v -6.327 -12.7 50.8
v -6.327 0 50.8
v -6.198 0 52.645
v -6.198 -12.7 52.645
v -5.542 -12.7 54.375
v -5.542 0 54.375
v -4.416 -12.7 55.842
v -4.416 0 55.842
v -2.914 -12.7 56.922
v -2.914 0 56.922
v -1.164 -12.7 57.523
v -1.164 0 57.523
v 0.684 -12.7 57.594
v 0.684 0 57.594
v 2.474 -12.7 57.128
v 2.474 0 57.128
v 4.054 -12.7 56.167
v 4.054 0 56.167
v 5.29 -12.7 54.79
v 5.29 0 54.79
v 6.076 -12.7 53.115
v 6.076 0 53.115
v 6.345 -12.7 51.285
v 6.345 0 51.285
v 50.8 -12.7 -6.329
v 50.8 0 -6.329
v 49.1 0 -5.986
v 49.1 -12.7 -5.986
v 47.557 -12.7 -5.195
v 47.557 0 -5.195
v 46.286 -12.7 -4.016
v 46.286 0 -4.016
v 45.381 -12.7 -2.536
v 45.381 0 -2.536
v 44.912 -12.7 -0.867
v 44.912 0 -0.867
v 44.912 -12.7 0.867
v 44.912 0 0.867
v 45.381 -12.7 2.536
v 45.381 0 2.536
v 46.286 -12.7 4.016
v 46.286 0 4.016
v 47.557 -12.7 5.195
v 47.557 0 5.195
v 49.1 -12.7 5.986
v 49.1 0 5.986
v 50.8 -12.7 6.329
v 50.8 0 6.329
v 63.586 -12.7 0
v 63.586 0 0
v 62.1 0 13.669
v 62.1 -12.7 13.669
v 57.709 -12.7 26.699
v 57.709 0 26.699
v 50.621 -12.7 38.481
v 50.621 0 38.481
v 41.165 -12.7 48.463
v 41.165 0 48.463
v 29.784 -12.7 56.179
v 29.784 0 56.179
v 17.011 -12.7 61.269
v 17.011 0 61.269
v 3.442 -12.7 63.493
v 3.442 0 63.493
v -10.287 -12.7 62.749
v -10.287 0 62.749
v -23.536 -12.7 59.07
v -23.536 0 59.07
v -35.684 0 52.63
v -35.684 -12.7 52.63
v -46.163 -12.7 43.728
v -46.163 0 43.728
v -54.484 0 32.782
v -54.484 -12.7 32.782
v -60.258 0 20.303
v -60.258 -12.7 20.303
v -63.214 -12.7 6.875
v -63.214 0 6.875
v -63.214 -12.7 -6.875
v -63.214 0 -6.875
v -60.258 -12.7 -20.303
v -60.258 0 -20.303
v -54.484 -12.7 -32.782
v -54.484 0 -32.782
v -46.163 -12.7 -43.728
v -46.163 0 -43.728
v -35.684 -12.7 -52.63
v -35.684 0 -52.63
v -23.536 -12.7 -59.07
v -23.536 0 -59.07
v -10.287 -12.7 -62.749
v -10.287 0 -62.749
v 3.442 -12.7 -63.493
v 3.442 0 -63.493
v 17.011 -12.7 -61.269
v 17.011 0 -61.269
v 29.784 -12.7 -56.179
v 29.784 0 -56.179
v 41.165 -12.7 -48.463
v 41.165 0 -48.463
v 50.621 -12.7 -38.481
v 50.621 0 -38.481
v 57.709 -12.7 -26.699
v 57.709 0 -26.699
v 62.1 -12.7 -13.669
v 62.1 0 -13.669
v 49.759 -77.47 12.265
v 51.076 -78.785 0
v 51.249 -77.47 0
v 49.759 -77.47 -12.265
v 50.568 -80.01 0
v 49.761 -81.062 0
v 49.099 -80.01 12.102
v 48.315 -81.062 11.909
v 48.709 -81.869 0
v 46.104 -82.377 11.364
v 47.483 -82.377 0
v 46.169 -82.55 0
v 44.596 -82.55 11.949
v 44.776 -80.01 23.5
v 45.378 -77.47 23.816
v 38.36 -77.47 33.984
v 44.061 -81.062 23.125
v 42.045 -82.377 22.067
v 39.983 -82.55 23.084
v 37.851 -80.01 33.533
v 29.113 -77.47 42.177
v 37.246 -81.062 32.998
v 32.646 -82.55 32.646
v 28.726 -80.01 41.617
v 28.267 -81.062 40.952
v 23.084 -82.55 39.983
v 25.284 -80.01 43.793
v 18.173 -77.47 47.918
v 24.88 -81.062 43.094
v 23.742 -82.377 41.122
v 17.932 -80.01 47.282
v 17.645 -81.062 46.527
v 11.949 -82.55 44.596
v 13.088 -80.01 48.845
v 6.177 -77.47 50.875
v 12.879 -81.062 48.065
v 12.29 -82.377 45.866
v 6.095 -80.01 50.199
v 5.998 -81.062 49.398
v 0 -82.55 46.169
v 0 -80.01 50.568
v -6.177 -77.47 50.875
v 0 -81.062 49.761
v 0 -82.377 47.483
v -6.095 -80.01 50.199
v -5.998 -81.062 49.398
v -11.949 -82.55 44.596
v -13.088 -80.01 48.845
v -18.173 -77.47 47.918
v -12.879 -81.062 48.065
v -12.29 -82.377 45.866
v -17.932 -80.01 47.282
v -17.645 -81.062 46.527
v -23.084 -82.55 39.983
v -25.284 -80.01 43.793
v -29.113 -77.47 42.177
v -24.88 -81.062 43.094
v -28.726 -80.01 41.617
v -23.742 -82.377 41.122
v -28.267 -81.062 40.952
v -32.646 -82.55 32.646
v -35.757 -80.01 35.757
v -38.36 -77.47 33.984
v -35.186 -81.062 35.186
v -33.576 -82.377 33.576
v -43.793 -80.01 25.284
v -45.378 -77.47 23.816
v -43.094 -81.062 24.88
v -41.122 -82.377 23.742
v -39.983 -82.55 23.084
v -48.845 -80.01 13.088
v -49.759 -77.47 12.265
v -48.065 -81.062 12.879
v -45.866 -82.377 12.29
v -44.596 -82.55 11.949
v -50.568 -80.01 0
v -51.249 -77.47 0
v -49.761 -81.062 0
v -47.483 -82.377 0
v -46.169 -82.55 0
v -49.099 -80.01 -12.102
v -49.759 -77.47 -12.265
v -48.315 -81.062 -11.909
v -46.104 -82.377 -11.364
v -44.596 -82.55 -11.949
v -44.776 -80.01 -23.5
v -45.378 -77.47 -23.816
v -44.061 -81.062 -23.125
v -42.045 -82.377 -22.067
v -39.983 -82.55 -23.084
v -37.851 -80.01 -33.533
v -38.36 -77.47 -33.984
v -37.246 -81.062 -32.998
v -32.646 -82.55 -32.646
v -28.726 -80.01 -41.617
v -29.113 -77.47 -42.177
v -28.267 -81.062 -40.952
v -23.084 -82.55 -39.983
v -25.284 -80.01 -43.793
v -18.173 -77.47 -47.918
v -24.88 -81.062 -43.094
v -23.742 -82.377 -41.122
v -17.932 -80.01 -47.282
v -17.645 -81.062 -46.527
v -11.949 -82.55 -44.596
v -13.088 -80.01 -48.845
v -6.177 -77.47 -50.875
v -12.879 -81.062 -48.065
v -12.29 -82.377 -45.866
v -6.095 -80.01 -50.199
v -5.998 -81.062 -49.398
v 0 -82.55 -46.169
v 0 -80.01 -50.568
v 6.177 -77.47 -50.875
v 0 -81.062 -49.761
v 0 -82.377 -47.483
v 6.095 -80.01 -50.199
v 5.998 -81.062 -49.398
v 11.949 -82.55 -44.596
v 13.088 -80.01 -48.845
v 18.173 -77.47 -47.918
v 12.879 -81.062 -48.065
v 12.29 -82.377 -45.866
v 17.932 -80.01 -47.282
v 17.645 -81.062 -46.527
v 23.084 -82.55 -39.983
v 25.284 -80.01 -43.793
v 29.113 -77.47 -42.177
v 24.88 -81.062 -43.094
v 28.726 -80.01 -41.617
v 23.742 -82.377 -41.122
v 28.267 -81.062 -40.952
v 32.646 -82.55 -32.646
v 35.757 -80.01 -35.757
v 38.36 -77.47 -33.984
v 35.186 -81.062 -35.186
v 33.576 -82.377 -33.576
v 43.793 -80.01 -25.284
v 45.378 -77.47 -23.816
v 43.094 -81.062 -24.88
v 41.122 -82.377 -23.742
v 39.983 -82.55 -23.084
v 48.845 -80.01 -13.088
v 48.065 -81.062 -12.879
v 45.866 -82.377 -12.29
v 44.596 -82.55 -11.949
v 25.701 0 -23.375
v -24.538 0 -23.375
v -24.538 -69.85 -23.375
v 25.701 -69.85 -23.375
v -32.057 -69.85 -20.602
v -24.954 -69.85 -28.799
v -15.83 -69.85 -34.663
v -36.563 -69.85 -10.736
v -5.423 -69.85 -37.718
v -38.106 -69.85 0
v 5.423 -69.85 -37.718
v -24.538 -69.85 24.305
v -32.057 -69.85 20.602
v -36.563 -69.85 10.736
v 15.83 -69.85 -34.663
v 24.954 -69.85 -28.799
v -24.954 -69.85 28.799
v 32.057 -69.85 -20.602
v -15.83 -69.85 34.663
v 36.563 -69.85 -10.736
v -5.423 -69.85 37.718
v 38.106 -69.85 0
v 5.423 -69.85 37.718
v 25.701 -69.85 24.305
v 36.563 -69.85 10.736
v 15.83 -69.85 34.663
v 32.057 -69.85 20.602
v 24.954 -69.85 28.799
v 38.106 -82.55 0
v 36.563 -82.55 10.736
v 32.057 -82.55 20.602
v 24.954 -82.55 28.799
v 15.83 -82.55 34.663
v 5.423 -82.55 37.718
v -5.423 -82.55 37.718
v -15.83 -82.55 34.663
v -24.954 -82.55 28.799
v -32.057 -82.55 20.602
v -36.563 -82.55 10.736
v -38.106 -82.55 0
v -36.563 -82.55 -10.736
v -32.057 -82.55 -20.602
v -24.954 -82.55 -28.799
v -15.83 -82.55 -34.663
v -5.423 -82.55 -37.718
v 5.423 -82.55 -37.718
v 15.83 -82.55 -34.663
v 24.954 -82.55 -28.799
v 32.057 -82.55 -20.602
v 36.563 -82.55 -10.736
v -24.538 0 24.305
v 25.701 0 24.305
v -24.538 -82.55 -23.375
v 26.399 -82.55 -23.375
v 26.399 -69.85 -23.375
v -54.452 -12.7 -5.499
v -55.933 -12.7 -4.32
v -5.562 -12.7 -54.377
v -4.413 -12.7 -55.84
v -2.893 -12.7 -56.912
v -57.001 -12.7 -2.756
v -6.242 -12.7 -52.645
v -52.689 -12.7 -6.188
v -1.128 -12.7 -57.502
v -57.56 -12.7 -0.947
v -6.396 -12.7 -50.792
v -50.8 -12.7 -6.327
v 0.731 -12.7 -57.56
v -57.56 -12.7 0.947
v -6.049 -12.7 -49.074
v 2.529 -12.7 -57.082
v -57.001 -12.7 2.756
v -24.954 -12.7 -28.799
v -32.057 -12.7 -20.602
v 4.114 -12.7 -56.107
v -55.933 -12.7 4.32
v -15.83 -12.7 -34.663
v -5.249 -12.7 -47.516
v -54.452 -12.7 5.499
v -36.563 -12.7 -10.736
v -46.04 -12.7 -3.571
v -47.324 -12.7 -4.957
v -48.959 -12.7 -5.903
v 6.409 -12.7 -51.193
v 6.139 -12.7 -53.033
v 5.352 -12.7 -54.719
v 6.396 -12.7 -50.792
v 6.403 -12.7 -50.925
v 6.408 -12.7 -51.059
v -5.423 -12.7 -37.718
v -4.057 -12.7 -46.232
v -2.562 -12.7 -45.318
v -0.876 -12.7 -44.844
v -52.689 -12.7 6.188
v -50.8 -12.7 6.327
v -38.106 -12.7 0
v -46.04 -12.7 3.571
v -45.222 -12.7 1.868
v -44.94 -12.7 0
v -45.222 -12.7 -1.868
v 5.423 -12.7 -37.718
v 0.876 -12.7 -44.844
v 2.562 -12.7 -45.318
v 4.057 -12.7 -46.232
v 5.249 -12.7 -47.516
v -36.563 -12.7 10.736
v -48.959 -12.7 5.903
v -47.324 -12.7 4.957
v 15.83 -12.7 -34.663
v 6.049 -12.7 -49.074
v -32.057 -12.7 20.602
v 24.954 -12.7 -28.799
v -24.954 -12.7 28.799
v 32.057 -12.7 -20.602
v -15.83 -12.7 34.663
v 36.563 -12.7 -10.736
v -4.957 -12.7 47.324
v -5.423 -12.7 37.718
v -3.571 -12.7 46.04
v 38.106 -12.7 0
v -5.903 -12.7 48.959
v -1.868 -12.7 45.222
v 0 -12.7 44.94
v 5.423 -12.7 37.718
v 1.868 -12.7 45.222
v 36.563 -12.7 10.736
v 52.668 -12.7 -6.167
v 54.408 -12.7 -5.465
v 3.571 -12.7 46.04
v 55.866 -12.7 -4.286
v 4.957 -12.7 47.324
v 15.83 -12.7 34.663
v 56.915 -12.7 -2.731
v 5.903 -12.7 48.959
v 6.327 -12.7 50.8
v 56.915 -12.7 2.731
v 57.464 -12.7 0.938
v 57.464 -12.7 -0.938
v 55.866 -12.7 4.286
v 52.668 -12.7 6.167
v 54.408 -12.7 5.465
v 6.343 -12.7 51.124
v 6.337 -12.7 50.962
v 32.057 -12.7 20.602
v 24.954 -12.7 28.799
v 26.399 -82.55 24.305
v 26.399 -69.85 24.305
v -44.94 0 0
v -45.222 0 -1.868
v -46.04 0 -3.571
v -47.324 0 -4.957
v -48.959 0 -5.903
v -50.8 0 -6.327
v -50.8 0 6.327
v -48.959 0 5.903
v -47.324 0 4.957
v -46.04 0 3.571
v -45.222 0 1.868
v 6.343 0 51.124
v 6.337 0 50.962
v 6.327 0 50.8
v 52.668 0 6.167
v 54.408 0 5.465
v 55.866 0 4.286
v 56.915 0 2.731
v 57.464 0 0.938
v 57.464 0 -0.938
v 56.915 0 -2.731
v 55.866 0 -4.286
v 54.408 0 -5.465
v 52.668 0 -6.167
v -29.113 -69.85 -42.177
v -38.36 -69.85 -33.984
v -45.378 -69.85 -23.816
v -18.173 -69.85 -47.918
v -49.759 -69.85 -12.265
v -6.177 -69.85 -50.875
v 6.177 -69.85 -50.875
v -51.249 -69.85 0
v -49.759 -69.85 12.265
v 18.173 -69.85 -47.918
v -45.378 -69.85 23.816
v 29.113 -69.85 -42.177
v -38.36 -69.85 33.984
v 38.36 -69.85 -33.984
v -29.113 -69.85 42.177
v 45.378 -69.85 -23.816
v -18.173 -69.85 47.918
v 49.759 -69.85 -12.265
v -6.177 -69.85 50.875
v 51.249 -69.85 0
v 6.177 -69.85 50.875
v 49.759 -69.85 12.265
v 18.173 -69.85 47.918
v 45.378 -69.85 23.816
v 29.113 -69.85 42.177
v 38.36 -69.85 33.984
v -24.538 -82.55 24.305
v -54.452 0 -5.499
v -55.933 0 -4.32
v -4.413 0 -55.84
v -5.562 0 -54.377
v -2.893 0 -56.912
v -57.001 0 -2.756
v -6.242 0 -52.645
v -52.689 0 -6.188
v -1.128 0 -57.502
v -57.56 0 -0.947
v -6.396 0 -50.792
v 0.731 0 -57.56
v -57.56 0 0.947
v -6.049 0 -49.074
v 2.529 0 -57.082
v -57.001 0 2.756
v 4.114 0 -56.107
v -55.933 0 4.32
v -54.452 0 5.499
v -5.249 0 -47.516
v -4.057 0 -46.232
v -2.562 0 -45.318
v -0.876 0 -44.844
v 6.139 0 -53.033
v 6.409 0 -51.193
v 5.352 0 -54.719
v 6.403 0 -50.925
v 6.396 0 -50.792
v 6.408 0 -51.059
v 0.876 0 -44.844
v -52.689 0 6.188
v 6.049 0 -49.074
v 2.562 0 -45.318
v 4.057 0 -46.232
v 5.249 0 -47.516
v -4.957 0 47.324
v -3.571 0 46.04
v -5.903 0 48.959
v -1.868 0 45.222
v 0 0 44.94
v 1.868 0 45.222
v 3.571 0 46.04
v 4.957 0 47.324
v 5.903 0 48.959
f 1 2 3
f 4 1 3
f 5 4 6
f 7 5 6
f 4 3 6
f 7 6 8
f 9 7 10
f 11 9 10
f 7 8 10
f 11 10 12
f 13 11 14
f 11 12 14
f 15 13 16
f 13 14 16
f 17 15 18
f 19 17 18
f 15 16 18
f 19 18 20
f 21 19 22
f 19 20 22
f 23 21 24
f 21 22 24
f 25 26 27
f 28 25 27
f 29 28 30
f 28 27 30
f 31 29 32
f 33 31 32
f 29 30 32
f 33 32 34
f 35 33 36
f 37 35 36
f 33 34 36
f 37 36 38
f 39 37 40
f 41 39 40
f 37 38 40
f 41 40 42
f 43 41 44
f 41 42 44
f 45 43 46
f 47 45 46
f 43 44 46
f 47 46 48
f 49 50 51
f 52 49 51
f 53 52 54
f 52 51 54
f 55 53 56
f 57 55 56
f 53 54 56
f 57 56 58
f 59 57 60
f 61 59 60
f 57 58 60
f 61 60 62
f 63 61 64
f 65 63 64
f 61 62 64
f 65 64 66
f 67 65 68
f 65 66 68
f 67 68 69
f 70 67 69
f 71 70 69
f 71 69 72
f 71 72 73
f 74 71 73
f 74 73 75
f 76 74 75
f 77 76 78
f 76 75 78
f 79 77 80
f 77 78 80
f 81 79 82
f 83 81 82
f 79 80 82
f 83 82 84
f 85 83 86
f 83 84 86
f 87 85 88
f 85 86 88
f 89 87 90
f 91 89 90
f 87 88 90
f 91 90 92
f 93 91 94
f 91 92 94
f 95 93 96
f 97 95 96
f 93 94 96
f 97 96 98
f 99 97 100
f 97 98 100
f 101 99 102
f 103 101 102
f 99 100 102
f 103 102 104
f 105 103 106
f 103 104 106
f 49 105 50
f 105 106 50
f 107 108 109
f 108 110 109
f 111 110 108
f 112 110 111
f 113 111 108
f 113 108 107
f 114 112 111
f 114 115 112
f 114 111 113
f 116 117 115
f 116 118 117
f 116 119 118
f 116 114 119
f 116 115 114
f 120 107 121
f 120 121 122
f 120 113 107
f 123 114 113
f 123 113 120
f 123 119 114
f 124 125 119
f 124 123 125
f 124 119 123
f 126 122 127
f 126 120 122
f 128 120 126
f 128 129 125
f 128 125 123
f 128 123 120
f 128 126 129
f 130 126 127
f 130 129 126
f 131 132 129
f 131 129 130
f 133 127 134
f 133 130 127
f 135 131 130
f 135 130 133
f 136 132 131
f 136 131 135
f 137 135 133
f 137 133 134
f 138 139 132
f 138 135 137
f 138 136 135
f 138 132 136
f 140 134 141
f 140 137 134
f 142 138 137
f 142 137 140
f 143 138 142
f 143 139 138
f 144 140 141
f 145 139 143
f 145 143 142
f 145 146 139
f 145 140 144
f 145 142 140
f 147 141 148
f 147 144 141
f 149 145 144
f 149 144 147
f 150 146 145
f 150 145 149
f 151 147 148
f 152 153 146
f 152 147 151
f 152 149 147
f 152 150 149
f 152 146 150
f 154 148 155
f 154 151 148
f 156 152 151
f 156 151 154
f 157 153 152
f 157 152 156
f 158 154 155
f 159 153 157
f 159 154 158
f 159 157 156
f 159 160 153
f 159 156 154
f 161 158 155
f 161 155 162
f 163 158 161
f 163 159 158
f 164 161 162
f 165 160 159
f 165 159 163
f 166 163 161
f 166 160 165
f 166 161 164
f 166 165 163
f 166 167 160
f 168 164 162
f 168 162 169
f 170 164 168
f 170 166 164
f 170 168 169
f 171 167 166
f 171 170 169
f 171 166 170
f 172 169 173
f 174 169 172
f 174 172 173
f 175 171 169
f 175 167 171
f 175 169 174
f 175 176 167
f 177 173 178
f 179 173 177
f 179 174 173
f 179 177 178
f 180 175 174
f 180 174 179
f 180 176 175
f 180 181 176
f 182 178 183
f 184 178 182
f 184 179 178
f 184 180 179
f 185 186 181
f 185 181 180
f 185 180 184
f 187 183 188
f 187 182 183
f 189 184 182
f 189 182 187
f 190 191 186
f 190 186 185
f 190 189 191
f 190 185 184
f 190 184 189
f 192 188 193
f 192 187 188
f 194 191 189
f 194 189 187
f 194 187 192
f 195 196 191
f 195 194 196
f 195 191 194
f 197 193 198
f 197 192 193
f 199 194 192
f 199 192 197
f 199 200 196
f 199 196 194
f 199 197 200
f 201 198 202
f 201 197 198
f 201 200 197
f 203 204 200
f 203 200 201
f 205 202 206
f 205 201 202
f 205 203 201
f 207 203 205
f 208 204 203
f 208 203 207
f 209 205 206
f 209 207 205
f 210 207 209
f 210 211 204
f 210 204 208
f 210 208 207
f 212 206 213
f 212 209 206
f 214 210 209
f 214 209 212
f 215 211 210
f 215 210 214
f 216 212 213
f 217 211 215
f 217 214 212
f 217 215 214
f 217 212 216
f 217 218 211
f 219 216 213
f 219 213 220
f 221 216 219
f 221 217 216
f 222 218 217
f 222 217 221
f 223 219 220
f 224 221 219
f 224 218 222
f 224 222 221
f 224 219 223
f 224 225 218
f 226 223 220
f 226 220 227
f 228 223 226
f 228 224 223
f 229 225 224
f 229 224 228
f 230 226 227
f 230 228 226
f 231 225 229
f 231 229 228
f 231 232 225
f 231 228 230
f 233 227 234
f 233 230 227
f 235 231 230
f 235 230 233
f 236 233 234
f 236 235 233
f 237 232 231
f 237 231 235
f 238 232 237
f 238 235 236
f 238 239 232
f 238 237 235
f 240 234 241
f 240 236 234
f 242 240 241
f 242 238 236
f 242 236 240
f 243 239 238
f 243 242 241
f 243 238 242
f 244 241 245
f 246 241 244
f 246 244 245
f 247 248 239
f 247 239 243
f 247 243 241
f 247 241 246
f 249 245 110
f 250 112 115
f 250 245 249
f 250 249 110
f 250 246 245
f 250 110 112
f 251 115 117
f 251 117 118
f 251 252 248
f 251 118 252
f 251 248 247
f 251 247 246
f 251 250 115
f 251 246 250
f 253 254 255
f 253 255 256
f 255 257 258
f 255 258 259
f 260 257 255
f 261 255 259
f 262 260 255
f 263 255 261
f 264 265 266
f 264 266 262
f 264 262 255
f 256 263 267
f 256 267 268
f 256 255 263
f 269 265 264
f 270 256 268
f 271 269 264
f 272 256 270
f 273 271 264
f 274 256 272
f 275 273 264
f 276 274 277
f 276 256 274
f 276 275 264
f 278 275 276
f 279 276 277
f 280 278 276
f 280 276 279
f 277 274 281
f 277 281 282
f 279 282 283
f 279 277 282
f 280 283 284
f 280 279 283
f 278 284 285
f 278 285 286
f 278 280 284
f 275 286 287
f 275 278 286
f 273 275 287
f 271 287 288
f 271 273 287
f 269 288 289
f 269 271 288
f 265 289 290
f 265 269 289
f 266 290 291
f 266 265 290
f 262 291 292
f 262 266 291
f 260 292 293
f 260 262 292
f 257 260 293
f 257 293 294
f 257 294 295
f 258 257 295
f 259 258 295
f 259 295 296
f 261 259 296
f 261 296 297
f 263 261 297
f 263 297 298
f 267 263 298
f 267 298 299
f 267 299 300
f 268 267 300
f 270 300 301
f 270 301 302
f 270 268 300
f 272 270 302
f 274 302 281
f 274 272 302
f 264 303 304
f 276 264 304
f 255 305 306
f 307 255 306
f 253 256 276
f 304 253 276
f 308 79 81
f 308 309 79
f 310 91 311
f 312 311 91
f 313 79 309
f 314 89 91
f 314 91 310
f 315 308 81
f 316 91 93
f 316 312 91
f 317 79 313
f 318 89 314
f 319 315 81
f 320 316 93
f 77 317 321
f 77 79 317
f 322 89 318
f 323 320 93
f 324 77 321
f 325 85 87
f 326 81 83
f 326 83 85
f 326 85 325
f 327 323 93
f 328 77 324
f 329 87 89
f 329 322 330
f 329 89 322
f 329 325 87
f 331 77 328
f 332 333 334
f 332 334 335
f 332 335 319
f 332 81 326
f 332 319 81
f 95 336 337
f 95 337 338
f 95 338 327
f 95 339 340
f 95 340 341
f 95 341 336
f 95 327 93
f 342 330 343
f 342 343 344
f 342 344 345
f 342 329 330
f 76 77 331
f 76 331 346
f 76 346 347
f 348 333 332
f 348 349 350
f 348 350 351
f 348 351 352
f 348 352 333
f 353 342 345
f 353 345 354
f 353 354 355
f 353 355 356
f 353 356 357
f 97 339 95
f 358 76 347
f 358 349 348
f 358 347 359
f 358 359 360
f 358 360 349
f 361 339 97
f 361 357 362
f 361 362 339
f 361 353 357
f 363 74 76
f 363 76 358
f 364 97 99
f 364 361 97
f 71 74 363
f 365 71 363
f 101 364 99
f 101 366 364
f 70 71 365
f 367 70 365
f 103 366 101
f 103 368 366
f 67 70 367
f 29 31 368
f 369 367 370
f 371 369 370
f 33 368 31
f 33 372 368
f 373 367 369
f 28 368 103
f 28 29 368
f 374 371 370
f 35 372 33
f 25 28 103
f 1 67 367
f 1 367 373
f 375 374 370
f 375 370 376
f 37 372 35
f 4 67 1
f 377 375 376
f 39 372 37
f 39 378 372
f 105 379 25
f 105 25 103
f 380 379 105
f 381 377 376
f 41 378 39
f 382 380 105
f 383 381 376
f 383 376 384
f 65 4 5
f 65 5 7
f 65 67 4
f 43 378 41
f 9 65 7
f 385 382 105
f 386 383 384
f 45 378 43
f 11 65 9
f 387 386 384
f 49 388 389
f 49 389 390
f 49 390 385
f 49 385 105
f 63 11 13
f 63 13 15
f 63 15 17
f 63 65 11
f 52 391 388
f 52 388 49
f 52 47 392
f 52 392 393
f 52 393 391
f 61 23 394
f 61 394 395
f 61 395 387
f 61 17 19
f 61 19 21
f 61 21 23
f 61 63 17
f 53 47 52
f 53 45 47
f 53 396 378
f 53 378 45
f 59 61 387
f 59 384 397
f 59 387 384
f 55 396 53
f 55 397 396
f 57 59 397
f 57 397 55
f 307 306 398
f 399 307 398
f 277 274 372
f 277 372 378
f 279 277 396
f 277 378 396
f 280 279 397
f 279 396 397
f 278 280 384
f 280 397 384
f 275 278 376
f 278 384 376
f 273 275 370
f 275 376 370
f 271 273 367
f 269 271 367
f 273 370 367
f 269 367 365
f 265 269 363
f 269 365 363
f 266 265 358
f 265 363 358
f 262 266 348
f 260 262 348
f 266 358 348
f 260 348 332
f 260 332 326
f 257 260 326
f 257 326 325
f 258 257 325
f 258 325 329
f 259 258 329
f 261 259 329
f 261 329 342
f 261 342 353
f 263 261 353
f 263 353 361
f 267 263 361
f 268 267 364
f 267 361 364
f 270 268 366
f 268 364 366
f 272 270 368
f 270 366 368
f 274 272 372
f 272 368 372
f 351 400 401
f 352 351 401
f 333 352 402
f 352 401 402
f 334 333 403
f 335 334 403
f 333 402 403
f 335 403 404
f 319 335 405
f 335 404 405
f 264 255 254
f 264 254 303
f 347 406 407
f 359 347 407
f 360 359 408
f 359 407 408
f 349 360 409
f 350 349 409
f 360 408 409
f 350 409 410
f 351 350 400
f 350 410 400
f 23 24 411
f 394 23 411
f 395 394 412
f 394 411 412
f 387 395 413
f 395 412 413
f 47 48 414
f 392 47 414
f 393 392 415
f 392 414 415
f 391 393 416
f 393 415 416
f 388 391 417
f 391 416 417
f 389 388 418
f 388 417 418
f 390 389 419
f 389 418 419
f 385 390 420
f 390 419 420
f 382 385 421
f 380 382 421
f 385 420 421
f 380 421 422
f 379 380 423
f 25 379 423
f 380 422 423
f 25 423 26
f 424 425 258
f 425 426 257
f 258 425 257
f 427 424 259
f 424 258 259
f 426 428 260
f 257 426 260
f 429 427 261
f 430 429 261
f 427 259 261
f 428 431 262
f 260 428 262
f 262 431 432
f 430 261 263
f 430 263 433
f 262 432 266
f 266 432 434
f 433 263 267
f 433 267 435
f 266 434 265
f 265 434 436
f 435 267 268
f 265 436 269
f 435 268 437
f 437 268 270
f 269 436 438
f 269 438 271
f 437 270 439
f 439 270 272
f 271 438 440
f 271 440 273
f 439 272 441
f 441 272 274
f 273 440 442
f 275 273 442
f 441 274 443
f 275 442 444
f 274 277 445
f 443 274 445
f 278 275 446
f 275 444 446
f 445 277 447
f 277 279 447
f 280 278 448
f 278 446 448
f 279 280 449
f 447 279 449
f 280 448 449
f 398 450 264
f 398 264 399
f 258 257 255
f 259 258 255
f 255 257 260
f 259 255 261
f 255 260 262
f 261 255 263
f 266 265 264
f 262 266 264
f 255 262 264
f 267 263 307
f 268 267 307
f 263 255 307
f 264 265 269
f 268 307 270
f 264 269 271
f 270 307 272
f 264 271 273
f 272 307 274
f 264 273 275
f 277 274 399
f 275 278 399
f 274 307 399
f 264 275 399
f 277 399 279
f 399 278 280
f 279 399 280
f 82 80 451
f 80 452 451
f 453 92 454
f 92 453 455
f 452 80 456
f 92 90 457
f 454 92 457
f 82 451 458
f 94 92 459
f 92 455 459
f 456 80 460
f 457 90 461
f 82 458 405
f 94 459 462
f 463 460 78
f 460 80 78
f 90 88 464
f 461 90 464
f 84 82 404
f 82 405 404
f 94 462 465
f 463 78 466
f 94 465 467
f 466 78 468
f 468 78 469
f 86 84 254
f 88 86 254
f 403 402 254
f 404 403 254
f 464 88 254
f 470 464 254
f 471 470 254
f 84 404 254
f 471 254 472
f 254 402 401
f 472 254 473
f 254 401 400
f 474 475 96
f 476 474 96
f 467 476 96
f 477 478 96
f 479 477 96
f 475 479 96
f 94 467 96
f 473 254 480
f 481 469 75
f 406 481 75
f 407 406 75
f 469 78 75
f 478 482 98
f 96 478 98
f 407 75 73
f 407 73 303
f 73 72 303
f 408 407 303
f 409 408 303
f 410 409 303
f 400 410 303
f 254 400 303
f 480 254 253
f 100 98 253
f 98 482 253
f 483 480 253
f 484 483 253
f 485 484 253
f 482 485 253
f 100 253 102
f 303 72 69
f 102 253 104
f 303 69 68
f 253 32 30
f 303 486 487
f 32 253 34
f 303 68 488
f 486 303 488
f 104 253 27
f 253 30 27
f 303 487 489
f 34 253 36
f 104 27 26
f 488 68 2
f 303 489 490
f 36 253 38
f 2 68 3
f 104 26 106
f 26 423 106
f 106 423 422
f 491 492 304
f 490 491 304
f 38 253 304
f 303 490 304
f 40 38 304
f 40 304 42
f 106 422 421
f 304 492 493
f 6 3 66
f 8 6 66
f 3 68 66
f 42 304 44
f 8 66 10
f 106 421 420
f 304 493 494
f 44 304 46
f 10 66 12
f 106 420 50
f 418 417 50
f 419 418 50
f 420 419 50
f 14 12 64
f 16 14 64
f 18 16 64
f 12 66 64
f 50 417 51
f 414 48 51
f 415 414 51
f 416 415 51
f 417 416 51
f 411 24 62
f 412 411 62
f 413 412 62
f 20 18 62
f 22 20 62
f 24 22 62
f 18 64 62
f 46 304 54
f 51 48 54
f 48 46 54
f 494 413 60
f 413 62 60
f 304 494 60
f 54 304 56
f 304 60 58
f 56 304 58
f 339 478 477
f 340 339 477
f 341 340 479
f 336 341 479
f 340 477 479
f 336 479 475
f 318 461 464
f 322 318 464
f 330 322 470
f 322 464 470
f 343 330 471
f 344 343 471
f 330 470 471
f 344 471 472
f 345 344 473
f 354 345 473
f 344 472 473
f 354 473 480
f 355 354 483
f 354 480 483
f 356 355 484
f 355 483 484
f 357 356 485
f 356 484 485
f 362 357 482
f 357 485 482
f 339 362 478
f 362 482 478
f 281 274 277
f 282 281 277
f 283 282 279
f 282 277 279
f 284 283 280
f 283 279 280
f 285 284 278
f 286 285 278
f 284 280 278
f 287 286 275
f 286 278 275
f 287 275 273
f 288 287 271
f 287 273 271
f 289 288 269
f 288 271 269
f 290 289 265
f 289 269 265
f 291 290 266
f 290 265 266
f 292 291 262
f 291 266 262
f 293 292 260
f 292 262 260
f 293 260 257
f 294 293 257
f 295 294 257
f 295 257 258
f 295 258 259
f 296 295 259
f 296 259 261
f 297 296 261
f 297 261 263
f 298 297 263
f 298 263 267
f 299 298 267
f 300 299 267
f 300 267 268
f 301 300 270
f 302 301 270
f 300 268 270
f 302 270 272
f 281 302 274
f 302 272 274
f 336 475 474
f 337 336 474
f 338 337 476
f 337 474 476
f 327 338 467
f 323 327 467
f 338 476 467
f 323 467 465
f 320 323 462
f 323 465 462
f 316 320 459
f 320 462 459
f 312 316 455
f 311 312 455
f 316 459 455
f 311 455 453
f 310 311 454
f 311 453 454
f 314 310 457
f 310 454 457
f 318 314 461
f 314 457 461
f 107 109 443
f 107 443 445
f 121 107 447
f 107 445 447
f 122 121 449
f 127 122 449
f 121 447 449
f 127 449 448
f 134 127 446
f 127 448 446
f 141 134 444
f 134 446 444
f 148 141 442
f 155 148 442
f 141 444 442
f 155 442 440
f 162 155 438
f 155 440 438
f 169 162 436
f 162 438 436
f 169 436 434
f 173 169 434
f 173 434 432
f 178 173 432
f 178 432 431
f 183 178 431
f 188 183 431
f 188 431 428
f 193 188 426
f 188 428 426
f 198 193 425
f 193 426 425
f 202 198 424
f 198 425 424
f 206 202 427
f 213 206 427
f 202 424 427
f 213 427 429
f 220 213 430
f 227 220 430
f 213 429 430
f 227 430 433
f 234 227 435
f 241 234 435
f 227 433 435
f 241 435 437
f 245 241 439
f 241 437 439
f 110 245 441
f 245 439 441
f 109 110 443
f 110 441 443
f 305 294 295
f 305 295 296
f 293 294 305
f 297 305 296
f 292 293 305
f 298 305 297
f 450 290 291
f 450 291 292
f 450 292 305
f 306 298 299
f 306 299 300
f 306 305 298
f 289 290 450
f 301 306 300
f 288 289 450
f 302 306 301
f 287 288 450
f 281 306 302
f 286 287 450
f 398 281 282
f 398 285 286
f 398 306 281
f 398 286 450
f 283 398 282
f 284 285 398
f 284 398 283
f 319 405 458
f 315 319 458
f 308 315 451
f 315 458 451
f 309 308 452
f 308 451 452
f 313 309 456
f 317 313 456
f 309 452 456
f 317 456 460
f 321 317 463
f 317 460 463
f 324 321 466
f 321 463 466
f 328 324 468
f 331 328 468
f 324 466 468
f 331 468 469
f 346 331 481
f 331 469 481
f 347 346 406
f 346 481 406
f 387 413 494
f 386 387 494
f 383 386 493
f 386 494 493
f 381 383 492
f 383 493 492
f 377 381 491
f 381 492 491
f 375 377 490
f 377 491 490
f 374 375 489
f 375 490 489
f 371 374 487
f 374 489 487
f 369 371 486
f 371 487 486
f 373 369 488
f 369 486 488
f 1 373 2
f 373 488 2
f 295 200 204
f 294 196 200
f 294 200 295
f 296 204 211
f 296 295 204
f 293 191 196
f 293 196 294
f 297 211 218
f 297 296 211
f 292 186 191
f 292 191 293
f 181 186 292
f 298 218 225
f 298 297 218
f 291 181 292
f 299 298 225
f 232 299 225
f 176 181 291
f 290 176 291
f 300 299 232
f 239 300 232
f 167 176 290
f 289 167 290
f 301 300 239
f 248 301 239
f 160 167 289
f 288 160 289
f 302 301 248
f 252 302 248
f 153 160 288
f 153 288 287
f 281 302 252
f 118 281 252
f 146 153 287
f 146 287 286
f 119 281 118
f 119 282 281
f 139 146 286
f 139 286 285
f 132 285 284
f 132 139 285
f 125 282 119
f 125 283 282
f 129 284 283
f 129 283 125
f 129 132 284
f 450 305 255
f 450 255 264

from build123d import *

# Parameters (mm, degrees)
F0_R      = 63.58634276
F1_DEPTH  = 12.7
F2_R      = 38.1063465956
F3_DEPTH  = 57.15
F4_R      = 51.2486821377
F4_R_2    = 38.1063465956
F5_DEPTH  = 12.7
F6_DEPTH  = 12.7
F7_W      = 50.9365983307
F7_H      = 47.6803779602
F8_DEPTH  = 80.518
F9_W      = 50.2388384193
F9_H      = 47.6803779602
F10_DEPTH = 76.2
F11_R     = 5.08


with BuildPart() as f1:
    # F0 (on Front) → F1 (new body)
    with BuildSketch(Plane.XZ):
        Circle(F0_R)
        with BuildLine():
            ThreePointArc((-50.8002620834, -6.3266222589), (-57.6306849484, 0), (-50.8002620834, 6.3266222589))
            ThreePointArc((-50.8002620834, 6.3266222589), (-36.198705237, 36.198708763), (-6.3266173105, 50.8002626996))
            ThreePointArc((-6.3266173105, 50.8002626996), (-0.2427860502, 57.6260293987), (6.3451967395, 51.2854792178))
            ThreePointArc((6.3451967395, 51.2854792178), (6.340550181, 51.0426931676), (6.3266173105, 50.8002626996))
            ThreePointArc((6.3266173105, 50.8002626996), (36.1980247945, 36.1993891927), (50.8000242013, 6.3285320647))
            ThreePointArc((50.8000242013, 6.3285320647), (55.5352050309, 4.6203013939), (57.533405357, 0))
            ThreePointArc((57.533405357, 0), (55.5352050309, -4.6203013939), (50.8000242013, -6.3285320647))
            ThreePointArc((50.8000242013, -6.3285320647), (36.2228821576, -36.1745156863), (6.3964022479, -50.7915230647))
            ThreePointArc((6.3964022479, -50.7915230647), (6.4058278822, -50.9920143065), (6.4089707878, -51.1927023798))
            ThreePointArc((6.4089707878, -51.1927023798), (-0.2006880733, -57.598530262), (-6.3964022479, -50.7915230647))
            ThreePointArc((-6.3964022479, -50.7915230647), (-36.2235621326, -36.1738347894), (-50.8002620834, -6.3266222589))
        make_face(mode=Mode.SUBTRACT)
        with BuildLine():
            ThreePointArc((-50.8002620834, 6.3266222589), (-46.6303560457, 4.3117724961), (-44.9402809377, 0))
            ThreePointArc((-44.9402809377, 0), (-46.6303560457, -4.3117724961), (-50.8002620834, -6.3266222589))
            ThreePointArc((-50.8002620834, -6.3266222589), (-36.2235621326, -36.1738347894), (-6.3964022479, -50.7915230647))
            ThreePointArc((-6.3964022479, -50.7915230647), (0, -44.7837315919), (6.3964022479, -50.7915230647))
            ThreePointArc((6.3964022479, -50.7915230647), (36.2228821576, -36.1745156863), (50.8000242013, -6.3285320647))
            ThreePointArc((50.8000242013, -6.3285320647), (44.8519994025, 0), (50.8000242013, 6.3285320647))
            ThreePointArc((50.8000242013, 6.3285320647), (36.1980247945, 36.1993891927), (6.3266173105, 50.8002626996))
            ThreePointArc((6.3266173105, 50.8002626996), (0, 44.9402824782), (-6.3266173105, 50.8002626996))
            ThreePointArc((-6.3266173105, 50.8002626996), (-36.198705237, 36.198708763), (-50.8002620834, 6.3266222589))
        make_face()
    extrude(amount=F1_DEPTH)

    # F2 (on face) → F3 (join)
    with BuildSketch(Plane.XZ.offset(12.7)):
        Circle(F2_R)
    extrude(amount=F3_DEPTH)


with BuildPart() as f5:
    # F4 (on face) → F5 (new body)
    with BuildSketch(Plane.XZ.offset(69.85)):
        Circle(F4_R)
        Circle(F4_R_2, mode=Mode.SUBTRACT)
    extrude(amount=F5_DEPTH)

    # F11
    f11_edges = [f5.edges().sort_by_distance(p)[0] for p in [
        (-51.248682, -82.55, 0),
    ]]
    fillet(f11_edges, radius=F11_R)


with BuildPart() as f6:
    # F6 (new): a face of the model
    f6_faces = [f1.part.faces().sort_by_distance(p)[0] for p in [
        (0, -69.85, 0),
    ]]
    extrude(f6_faces, amount=F6_DEPTH)

    # F7 (on face) → F8 (cut)
    with BuildSketch(Plane.XZ.offset(82.55)):
        with Locations((0.9303465486, 0.4651751369)):
            Rectangle(F7_W, F7_H)
    extrude(amount=-F8_DEPTH, mode=Mode.SUBTRACT)


with BuildPart() as f1_1:
    add(f1.part)

    # F9 (on face) → F10 (cut)
    with BuildSketch(Plane.XZ.offset(69.85)):
        with Locations((0.5814684555, 0.4651751369)):
            Rectangle(F9_W, F9_H)
    extrude(amount=-F10_DEPTH, mode=Mode.SUBTRACT)


solid = Compound([f5.part, f6.part, f1_1.part])
